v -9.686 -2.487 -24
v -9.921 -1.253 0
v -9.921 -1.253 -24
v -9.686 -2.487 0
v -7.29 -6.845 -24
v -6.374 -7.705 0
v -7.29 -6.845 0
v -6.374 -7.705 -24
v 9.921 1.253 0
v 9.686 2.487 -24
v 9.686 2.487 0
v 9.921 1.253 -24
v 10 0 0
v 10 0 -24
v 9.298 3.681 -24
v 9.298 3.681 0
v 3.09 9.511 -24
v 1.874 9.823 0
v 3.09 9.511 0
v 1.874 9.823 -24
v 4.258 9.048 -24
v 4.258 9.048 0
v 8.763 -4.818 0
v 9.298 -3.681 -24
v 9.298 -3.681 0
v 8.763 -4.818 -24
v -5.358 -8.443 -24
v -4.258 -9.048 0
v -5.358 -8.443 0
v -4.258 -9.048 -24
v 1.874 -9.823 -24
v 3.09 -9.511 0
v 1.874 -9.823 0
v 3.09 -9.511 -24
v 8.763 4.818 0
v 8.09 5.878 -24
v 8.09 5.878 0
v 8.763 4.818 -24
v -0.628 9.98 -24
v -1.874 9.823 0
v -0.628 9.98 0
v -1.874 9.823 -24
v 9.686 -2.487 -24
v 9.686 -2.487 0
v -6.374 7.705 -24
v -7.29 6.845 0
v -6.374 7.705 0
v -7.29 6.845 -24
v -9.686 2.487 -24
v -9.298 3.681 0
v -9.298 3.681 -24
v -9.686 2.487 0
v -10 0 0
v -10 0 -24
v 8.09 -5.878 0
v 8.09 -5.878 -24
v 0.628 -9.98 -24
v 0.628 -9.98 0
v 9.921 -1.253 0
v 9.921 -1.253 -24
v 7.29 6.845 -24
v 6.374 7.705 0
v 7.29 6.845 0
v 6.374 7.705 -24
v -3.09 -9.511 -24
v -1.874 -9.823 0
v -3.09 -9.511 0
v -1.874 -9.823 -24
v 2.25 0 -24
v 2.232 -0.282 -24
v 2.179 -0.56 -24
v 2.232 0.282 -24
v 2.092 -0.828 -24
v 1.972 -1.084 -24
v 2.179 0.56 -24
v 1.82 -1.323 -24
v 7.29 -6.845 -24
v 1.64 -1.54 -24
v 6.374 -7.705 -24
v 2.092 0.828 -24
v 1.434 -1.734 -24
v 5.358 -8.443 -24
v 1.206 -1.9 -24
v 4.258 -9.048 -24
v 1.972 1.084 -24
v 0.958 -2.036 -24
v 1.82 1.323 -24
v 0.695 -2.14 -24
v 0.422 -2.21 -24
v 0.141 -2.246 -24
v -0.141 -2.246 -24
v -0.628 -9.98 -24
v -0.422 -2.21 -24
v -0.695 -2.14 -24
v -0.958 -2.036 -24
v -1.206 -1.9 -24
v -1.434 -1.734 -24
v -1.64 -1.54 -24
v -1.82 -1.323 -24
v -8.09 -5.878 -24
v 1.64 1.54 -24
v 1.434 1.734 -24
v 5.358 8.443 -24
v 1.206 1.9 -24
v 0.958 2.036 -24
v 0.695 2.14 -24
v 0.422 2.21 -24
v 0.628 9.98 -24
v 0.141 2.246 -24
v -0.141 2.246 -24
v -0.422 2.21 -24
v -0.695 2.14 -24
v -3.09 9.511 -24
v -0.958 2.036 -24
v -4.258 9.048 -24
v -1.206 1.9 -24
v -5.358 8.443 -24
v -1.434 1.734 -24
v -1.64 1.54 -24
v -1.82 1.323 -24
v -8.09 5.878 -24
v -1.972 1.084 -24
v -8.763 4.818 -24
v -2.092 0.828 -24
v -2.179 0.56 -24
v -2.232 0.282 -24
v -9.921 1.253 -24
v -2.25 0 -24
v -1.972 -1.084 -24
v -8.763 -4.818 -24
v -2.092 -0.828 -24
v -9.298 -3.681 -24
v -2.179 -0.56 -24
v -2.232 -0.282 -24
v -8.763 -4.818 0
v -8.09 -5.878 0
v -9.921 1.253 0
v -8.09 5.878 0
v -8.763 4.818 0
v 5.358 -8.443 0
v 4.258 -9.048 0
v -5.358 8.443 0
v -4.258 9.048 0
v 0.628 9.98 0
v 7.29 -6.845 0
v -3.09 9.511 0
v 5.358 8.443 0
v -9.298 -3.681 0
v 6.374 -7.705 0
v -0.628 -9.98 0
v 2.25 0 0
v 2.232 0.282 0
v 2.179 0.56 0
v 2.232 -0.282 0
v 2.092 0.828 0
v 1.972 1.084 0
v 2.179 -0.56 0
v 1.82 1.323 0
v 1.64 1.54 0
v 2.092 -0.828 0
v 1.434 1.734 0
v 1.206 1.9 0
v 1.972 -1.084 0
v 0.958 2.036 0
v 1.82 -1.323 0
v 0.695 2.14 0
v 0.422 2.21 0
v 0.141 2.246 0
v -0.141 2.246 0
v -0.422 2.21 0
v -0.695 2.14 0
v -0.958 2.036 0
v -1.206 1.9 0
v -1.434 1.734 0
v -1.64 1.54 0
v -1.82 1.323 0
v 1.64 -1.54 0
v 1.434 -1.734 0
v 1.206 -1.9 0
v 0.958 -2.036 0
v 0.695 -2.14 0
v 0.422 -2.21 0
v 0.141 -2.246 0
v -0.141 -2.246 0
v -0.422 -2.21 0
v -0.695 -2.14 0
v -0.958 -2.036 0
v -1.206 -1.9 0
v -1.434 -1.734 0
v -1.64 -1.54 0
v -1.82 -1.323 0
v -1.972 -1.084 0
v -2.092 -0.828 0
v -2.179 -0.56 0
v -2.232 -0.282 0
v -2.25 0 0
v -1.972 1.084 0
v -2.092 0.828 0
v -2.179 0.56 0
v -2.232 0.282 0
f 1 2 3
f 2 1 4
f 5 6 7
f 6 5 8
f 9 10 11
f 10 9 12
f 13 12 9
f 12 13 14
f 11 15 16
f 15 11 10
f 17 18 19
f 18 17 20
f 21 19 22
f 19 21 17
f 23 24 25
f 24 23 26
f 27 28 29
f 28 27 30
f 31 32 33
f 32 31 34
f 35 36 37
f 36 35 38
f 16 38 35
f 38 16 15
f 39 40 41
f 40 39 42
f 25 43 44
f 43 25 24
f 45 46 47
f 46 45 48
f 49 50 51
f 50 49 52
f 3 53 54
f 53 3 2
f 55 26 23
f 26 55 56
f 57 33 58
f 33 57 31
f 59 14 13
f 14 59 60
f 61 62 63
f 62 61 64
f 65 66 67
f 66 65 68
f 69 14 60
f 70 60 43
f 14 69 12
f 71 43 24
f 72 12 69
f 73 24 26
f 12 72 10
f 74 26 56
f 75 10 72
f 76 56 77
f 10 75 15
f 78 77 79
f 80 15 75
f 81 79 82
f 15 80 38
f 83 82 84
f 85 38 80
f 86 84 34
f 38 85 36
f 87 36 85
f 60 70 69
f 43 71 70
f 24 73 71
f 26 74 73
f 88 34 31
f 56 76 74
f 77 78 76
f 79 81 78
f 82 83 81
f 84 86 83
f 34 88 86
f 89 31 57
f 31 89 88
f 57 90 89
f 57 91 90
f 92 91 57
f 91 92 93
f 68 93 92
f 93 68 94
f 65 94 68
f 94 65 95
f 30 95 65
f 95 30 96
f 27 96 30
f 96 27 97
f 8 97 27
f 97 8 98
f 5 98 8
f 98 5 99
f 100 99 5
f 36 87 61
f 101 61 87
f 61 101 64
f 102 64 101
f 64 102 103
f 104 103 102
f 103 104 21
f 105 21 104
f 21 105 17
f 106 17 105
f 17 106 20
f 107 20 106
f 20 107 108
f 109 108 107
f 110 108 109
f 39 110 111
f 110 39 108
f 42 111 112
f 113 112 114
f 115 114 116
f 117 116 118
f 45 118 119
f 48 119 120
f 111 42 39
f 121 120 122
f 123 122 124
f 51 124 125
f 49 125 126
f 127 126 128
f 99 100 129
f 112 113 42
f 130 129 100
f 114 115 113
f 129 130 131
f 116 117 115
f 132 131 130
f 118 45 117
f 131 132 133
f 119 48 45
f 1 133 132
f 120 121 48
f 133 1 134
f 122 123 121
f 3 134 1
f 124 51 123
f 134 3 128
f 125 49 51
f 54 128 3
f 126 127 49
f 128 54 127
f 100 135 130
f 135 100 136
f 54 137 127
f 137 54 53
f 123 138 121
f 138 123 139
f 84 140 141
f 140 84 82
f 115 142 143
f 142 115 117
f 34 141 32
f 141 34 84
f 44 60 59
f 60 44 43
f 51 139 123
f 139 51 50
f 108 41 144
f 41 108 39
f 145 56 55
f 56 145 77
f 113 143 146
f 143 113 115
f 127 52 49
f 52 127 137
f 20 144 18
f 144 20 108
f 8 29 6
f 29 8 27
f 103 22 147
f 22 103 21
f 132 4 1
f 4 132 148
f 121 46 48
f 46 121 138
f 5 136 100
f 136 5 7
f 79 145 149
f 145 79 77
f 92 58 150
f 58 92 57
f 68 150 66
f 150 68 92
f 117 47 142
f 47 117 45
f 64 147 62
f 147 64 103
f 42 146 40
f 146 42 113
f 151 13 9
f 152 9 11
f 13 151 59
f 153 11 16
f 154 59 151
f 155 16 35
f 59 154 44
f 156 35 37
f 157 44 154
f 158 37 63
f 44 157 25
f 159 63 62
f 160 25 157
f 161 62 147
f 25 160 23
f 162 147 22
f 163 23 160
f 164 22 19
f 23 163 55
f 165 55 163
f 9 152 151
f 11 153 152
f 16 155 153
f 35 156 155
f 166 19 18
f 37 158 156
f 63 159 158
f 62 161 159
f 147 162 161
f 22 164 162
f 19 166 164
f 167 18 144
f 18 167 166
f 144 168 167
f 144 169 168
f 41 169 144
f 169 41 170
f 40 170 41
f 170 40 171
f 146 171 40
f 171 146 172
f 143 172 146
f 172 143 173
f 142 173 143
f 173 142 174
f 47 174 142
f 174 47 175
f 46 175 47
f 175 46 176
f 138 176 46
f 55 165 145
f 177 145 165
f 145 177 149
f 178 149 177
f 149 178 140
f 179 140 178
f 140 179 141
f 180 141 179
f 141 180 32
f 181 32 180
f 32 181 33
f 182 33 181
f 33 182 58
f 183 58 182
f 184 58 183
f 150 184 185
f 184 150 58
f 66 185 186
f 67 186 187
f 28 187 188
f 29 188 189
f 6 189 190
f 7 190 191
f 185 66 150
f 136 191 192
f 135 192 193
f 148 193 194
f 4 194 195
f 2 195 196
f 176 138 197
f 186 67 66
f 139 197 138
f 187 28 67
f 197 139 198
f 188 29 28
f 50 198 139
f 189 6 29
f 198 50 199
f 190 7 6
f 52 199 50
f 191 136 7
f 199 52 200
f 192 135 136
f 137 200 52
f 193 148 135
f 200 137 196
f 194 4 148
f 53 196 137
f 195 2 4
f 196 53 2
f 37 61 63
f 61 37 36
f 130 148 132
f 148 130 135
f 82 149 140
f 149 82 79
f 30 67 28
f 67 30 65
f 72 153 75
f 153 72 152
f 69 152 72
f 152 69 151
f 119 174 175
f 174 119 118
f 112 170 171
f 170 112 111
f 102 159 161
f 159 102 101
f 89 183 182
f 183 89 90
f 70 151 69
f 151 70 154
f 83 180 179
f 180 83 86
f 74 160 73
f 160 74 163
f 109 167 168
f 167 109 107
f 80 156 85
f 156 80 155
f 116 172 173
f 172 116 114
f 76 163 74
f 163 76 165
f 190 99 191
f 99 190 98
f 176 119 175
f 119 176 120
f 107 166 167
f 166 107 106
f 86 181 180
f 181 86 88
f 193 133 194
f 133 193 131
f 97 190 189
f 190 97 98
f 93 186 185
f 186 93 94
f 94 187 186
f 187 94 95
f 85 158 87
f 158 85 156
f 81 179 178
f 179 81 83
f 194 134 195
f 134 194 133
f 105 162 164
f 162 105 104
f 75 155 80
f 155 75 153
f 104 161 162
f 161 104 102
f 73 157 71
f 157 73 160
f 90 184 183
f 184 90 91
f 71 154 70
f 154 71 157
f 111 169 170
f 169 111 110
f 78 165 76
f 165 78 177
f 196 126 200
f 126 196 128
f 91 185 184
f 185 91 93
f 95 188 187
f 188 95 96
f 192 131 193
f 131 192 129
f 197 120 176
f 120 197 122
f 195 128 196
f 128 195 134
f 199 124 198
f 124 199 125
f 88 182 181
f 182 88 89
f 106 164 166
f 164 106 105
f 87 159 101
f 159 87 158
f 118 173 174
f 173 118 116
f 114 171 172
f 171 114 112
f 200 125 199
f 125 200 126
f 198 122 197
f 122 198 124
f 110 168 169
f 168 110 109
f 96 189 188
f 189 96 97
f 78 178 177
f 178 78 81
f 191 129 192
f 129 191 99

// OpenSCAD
$fn = 50;


difference() {
	union() {
		translate(v = [0, 0, -24.0000000000]) {
			cylinder(h = 24, r = 10.0000000000);
		}
		cylinder(h = 0, r = 20.0000000000);
	}
	union() {
		#translate(v = [0, 0, -24]) {
			cylinder(h = 24, r = 2.2500000000);
		}
	}
}
